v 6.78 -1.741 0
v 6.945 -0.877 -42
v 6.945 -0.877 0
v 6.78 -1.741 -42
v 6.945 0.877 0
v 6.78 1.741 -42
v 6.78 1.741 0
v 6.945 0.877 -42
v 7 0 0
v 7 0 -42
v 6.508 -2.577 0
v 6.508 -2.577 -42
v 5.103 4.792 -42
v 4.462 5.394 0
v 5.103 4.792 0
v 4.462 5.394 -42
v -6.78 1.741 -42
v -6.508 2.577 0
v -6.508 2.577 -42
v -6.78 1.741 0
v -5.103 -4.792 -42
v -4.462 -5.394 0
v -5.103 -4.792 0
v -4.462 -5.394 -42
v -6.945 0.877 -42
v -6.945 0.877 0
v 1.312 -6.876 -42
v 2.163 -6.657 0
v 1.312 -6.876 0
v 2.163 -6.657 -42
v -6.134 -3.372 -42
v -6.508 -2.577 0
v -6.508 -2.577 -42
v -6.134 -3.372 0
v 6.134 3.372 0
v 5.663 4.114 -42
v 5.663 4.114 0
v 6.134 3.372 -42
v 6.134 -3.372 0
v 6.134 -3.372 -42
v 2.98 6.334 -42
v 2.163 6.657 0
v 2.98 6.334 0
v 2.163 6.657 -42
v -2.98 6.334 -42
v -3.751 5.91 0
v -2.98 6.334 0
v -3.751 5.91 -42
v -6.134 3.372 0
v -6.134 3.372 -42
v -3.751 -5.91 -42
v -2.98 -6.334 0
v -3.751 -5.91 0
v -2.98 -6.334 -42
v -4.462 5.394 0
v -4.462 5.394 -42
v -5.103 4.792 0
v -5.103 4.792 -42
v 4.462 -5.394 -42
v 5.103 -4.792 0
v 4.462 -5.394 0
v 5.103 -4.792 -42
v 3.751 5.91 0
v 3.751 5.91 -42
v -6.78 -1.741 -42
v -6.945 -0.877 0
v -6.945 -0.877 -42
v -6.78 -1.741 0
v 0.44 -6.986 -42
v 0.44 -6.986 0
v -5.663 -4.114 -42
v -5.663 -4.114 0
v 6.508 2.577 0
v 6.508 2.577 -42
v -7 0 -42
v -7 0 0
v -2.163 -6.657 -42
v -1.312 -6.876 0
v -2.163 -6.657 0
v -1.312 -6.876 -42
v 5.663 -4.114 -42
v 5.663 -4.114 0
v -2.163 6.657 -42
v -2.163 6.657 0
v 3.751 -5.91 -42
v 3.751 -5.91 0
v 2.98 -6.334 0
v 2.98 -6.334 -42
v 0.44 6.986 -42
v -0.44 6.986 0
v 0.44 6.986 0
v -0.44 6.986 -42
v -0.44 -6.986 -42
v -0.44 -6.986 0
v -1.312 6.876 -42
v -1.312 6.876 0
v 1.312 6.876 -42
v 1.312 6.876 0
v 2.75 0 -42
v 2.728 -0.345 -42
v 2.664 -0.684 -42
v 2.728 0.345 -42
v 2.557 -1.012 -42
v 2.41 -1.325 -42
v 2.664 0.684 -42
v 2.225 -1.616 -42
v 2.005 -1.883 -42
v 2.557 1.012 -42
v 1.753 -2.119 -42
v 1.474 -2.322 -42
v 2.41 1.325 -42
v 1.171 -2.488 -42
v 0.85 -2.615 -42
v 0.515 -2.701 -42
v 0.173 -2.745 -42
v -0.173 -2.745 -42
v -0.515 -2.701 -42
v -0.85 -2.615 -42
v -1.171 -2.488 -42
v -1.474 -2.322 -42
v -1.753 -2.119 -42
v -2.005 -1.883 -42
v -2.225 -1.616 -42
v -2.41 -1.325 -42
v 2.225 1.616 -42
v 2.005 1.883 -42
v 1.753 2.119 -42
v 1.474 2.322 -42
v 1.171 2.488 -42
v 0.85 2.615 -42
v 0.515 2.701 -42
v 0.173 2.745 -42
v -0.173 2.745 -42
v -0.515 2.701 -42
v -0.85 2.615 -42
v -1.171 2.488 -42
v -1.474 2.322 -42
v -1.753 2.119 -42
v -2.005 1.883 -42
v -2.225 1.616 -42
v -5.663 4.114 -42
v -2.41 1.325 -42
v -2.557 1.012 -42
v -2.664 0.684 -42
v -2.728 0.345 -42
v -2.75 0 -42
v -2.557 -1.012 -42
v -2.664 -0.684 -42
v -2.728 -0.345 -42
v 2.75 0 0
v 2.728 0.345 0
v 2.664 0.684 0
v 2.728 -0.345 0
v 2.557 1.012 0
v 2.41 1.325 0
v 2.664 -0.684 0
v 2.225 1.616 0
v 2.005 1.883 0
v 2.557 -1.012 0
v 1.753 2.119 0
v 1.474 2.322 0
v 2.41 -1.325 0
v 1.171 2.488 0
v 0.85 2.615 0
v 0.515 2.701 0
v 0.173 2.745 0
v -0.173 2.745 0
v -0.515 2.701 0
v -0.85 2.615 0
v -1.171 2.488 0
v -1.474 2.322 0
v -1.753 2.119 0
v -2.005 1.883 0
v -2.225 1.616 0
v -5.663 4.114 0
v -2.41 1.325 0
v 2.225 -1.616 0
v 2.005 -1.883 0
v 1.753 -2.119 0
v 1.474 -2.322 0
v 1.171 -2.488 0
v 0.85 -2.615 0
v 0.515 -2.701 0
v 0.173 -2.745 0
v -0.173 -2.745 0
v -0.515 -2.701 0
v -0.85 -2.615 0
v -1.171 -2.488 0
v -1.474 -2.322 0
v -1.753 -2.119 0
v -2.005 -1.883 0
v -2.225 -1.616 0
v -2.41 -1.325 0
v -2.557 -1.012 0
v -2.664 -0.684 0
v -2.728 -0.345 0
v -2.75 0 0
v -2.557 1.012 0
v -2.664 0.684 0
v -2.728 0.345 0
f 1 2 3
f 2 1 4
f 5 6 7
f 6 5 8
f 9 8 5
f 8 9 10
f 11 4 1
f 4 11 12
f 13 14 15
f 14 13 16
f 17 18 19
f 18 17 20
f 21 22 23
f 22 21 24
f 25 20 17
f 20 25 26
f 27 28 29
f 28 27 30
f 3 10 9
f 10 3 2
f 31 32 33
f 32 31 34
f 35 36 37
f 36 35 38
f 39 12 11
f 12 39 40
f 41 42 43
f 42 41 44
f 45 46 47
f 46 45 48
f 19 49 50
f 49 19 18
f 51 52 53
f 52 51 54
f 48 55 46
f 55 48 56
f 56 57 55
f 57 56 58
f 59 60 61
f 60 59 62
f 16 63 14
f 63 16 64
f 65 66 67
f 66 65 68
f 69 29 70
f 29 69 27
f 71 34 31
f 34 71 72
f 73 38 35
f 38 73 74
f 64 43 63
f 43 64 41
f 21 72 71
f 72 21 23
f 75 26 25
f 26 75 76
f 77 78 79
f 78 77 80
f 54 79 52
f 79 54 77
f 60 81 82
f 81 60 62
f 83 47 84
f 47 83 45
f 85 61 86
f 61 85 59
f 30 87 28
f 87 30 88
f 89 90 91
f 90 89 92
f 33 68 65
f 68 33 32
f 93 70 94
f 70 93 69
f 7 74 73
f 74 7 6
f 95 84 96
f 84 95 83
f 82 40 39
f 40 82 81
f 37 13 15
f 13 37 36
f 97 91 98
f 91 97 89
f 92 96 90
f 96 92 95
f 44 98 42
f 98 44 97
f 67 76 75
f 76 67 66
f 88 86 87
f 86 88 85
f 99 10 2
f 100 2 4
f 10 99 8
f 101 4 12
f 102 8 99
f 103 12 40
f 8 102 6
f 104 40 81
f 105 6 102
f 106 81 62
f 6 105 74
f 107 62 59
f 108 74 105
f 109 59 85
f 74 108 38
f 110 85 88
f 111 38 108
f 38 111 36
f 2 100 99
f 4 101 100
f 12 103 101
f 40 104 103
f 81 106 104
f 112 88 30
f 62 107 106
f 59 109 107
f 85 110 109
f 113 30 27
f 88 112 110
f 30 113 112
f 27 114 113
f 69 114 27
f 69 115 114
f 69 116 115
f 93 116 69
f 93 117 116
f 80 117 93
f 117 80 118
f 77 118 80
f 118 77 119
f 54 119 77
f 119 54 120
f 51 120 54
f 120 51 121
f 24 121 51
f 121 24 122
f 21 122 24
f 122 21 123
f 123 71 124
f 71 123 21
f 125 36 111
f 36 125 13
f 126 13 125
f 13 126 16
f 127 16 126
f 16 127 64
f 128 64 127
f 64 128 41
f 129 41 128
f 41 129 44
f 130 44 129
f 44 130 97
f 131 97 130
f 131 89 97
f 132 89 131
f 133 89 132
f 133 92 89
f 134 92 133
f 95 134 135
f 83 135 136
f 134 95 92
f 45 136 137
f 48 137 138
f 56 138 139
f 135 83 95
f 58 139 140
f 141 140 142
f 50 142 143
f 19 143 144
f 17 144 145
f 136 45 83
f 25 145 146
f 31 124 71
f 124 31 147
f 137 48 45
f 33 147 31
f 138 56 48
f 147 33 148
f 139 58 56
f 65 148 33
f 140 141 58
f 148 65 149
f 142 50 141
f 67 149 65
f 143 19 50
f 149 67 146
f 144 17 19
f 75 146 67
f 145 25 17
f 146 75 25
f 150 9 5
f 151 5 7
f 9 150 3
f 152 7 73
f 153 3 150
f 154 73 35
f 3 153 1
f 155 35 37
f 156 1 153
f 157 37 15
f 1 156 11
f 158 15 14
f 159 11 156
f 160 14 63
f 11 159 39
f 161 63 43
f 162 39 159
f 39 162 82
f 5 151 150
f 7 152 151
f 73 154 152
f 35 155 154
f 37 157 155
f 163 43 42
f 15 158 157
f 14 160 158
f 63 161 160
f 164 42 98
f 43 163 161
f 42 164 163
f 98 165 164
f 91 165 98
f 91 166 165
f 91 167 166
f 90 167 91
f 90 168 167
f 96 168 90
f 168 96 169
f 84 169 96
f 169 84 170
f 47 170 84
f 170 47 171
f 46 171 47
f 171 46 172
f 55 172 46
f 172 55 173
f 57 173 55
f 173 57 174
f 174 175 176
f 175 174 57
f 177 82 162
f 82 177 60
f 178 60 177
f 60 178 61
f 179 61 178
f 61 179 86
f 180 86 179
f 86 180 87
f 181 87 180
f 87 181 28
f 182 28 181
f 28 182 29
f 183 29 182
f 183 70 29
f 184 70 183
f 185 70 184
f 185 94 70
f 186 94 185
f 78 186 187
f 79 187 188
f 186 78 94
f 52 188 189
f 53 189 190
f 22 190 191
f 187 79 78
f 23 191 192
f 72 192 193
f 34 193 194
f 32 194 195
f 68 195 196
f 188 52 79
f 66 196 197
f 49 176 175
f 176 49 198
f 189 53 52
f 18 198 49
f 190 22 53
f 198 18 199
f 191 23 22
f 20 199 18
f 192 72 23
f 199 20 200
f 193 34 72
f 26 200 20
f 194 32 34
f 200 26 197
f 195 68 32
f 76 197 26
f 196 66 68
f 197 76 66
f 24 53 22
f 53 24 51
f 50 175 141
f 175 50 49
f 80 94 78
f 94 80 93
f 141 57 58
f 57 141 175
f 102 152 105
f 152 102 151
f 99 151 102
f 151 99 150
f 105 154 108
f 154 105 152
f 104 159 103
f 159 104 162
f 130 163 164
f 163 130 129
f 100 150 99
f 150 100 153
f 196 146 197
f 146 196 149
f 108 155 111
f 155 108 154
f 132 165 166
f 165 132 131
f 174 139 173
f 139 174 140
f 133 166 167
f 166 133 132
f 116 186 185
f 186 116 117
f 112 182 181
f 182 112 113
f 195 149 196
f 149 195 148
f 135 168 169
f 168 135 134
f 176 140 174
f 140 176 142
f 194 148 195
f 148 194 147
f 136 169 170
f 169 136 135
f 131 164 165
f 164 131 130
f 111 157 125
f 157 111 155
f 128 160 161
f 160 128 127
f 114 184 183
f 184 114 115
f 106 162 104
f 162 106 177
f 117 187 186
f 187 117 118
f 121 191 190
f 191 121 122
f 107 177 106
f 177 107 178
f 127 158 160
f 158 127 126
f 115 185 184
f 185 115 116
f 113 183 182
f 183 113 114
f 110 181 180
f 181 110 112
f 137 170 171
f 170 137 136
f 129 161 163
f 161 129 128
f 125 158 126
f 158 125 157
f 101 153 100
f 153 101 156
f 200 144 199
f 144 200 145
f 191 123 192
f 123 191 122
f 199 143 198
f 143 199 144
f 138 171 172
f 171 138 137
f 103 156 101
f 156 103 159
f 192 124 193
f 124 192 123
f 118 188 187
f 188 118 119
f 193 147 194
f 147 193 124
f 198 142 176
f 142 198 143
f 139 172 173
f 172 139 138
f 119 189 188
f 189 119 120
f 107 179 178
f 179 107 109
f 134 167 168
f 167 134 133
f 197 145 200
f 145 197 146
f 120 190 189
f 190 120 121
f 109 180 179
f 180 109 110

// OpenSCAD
$fn = 50;


difference() {
	union() {
		translate(v = [0, 0, -42.0000000000]) {
			cylinder(h = 42, r = 7.0000000000);
		}
		cylinder(h = 0, r = 10.0000000000);
	}
	union() {
		#translate(v = [0, 0, -42]) {
			cylinder(h = 42, r = 2.7500000000);
		}
	}
}
